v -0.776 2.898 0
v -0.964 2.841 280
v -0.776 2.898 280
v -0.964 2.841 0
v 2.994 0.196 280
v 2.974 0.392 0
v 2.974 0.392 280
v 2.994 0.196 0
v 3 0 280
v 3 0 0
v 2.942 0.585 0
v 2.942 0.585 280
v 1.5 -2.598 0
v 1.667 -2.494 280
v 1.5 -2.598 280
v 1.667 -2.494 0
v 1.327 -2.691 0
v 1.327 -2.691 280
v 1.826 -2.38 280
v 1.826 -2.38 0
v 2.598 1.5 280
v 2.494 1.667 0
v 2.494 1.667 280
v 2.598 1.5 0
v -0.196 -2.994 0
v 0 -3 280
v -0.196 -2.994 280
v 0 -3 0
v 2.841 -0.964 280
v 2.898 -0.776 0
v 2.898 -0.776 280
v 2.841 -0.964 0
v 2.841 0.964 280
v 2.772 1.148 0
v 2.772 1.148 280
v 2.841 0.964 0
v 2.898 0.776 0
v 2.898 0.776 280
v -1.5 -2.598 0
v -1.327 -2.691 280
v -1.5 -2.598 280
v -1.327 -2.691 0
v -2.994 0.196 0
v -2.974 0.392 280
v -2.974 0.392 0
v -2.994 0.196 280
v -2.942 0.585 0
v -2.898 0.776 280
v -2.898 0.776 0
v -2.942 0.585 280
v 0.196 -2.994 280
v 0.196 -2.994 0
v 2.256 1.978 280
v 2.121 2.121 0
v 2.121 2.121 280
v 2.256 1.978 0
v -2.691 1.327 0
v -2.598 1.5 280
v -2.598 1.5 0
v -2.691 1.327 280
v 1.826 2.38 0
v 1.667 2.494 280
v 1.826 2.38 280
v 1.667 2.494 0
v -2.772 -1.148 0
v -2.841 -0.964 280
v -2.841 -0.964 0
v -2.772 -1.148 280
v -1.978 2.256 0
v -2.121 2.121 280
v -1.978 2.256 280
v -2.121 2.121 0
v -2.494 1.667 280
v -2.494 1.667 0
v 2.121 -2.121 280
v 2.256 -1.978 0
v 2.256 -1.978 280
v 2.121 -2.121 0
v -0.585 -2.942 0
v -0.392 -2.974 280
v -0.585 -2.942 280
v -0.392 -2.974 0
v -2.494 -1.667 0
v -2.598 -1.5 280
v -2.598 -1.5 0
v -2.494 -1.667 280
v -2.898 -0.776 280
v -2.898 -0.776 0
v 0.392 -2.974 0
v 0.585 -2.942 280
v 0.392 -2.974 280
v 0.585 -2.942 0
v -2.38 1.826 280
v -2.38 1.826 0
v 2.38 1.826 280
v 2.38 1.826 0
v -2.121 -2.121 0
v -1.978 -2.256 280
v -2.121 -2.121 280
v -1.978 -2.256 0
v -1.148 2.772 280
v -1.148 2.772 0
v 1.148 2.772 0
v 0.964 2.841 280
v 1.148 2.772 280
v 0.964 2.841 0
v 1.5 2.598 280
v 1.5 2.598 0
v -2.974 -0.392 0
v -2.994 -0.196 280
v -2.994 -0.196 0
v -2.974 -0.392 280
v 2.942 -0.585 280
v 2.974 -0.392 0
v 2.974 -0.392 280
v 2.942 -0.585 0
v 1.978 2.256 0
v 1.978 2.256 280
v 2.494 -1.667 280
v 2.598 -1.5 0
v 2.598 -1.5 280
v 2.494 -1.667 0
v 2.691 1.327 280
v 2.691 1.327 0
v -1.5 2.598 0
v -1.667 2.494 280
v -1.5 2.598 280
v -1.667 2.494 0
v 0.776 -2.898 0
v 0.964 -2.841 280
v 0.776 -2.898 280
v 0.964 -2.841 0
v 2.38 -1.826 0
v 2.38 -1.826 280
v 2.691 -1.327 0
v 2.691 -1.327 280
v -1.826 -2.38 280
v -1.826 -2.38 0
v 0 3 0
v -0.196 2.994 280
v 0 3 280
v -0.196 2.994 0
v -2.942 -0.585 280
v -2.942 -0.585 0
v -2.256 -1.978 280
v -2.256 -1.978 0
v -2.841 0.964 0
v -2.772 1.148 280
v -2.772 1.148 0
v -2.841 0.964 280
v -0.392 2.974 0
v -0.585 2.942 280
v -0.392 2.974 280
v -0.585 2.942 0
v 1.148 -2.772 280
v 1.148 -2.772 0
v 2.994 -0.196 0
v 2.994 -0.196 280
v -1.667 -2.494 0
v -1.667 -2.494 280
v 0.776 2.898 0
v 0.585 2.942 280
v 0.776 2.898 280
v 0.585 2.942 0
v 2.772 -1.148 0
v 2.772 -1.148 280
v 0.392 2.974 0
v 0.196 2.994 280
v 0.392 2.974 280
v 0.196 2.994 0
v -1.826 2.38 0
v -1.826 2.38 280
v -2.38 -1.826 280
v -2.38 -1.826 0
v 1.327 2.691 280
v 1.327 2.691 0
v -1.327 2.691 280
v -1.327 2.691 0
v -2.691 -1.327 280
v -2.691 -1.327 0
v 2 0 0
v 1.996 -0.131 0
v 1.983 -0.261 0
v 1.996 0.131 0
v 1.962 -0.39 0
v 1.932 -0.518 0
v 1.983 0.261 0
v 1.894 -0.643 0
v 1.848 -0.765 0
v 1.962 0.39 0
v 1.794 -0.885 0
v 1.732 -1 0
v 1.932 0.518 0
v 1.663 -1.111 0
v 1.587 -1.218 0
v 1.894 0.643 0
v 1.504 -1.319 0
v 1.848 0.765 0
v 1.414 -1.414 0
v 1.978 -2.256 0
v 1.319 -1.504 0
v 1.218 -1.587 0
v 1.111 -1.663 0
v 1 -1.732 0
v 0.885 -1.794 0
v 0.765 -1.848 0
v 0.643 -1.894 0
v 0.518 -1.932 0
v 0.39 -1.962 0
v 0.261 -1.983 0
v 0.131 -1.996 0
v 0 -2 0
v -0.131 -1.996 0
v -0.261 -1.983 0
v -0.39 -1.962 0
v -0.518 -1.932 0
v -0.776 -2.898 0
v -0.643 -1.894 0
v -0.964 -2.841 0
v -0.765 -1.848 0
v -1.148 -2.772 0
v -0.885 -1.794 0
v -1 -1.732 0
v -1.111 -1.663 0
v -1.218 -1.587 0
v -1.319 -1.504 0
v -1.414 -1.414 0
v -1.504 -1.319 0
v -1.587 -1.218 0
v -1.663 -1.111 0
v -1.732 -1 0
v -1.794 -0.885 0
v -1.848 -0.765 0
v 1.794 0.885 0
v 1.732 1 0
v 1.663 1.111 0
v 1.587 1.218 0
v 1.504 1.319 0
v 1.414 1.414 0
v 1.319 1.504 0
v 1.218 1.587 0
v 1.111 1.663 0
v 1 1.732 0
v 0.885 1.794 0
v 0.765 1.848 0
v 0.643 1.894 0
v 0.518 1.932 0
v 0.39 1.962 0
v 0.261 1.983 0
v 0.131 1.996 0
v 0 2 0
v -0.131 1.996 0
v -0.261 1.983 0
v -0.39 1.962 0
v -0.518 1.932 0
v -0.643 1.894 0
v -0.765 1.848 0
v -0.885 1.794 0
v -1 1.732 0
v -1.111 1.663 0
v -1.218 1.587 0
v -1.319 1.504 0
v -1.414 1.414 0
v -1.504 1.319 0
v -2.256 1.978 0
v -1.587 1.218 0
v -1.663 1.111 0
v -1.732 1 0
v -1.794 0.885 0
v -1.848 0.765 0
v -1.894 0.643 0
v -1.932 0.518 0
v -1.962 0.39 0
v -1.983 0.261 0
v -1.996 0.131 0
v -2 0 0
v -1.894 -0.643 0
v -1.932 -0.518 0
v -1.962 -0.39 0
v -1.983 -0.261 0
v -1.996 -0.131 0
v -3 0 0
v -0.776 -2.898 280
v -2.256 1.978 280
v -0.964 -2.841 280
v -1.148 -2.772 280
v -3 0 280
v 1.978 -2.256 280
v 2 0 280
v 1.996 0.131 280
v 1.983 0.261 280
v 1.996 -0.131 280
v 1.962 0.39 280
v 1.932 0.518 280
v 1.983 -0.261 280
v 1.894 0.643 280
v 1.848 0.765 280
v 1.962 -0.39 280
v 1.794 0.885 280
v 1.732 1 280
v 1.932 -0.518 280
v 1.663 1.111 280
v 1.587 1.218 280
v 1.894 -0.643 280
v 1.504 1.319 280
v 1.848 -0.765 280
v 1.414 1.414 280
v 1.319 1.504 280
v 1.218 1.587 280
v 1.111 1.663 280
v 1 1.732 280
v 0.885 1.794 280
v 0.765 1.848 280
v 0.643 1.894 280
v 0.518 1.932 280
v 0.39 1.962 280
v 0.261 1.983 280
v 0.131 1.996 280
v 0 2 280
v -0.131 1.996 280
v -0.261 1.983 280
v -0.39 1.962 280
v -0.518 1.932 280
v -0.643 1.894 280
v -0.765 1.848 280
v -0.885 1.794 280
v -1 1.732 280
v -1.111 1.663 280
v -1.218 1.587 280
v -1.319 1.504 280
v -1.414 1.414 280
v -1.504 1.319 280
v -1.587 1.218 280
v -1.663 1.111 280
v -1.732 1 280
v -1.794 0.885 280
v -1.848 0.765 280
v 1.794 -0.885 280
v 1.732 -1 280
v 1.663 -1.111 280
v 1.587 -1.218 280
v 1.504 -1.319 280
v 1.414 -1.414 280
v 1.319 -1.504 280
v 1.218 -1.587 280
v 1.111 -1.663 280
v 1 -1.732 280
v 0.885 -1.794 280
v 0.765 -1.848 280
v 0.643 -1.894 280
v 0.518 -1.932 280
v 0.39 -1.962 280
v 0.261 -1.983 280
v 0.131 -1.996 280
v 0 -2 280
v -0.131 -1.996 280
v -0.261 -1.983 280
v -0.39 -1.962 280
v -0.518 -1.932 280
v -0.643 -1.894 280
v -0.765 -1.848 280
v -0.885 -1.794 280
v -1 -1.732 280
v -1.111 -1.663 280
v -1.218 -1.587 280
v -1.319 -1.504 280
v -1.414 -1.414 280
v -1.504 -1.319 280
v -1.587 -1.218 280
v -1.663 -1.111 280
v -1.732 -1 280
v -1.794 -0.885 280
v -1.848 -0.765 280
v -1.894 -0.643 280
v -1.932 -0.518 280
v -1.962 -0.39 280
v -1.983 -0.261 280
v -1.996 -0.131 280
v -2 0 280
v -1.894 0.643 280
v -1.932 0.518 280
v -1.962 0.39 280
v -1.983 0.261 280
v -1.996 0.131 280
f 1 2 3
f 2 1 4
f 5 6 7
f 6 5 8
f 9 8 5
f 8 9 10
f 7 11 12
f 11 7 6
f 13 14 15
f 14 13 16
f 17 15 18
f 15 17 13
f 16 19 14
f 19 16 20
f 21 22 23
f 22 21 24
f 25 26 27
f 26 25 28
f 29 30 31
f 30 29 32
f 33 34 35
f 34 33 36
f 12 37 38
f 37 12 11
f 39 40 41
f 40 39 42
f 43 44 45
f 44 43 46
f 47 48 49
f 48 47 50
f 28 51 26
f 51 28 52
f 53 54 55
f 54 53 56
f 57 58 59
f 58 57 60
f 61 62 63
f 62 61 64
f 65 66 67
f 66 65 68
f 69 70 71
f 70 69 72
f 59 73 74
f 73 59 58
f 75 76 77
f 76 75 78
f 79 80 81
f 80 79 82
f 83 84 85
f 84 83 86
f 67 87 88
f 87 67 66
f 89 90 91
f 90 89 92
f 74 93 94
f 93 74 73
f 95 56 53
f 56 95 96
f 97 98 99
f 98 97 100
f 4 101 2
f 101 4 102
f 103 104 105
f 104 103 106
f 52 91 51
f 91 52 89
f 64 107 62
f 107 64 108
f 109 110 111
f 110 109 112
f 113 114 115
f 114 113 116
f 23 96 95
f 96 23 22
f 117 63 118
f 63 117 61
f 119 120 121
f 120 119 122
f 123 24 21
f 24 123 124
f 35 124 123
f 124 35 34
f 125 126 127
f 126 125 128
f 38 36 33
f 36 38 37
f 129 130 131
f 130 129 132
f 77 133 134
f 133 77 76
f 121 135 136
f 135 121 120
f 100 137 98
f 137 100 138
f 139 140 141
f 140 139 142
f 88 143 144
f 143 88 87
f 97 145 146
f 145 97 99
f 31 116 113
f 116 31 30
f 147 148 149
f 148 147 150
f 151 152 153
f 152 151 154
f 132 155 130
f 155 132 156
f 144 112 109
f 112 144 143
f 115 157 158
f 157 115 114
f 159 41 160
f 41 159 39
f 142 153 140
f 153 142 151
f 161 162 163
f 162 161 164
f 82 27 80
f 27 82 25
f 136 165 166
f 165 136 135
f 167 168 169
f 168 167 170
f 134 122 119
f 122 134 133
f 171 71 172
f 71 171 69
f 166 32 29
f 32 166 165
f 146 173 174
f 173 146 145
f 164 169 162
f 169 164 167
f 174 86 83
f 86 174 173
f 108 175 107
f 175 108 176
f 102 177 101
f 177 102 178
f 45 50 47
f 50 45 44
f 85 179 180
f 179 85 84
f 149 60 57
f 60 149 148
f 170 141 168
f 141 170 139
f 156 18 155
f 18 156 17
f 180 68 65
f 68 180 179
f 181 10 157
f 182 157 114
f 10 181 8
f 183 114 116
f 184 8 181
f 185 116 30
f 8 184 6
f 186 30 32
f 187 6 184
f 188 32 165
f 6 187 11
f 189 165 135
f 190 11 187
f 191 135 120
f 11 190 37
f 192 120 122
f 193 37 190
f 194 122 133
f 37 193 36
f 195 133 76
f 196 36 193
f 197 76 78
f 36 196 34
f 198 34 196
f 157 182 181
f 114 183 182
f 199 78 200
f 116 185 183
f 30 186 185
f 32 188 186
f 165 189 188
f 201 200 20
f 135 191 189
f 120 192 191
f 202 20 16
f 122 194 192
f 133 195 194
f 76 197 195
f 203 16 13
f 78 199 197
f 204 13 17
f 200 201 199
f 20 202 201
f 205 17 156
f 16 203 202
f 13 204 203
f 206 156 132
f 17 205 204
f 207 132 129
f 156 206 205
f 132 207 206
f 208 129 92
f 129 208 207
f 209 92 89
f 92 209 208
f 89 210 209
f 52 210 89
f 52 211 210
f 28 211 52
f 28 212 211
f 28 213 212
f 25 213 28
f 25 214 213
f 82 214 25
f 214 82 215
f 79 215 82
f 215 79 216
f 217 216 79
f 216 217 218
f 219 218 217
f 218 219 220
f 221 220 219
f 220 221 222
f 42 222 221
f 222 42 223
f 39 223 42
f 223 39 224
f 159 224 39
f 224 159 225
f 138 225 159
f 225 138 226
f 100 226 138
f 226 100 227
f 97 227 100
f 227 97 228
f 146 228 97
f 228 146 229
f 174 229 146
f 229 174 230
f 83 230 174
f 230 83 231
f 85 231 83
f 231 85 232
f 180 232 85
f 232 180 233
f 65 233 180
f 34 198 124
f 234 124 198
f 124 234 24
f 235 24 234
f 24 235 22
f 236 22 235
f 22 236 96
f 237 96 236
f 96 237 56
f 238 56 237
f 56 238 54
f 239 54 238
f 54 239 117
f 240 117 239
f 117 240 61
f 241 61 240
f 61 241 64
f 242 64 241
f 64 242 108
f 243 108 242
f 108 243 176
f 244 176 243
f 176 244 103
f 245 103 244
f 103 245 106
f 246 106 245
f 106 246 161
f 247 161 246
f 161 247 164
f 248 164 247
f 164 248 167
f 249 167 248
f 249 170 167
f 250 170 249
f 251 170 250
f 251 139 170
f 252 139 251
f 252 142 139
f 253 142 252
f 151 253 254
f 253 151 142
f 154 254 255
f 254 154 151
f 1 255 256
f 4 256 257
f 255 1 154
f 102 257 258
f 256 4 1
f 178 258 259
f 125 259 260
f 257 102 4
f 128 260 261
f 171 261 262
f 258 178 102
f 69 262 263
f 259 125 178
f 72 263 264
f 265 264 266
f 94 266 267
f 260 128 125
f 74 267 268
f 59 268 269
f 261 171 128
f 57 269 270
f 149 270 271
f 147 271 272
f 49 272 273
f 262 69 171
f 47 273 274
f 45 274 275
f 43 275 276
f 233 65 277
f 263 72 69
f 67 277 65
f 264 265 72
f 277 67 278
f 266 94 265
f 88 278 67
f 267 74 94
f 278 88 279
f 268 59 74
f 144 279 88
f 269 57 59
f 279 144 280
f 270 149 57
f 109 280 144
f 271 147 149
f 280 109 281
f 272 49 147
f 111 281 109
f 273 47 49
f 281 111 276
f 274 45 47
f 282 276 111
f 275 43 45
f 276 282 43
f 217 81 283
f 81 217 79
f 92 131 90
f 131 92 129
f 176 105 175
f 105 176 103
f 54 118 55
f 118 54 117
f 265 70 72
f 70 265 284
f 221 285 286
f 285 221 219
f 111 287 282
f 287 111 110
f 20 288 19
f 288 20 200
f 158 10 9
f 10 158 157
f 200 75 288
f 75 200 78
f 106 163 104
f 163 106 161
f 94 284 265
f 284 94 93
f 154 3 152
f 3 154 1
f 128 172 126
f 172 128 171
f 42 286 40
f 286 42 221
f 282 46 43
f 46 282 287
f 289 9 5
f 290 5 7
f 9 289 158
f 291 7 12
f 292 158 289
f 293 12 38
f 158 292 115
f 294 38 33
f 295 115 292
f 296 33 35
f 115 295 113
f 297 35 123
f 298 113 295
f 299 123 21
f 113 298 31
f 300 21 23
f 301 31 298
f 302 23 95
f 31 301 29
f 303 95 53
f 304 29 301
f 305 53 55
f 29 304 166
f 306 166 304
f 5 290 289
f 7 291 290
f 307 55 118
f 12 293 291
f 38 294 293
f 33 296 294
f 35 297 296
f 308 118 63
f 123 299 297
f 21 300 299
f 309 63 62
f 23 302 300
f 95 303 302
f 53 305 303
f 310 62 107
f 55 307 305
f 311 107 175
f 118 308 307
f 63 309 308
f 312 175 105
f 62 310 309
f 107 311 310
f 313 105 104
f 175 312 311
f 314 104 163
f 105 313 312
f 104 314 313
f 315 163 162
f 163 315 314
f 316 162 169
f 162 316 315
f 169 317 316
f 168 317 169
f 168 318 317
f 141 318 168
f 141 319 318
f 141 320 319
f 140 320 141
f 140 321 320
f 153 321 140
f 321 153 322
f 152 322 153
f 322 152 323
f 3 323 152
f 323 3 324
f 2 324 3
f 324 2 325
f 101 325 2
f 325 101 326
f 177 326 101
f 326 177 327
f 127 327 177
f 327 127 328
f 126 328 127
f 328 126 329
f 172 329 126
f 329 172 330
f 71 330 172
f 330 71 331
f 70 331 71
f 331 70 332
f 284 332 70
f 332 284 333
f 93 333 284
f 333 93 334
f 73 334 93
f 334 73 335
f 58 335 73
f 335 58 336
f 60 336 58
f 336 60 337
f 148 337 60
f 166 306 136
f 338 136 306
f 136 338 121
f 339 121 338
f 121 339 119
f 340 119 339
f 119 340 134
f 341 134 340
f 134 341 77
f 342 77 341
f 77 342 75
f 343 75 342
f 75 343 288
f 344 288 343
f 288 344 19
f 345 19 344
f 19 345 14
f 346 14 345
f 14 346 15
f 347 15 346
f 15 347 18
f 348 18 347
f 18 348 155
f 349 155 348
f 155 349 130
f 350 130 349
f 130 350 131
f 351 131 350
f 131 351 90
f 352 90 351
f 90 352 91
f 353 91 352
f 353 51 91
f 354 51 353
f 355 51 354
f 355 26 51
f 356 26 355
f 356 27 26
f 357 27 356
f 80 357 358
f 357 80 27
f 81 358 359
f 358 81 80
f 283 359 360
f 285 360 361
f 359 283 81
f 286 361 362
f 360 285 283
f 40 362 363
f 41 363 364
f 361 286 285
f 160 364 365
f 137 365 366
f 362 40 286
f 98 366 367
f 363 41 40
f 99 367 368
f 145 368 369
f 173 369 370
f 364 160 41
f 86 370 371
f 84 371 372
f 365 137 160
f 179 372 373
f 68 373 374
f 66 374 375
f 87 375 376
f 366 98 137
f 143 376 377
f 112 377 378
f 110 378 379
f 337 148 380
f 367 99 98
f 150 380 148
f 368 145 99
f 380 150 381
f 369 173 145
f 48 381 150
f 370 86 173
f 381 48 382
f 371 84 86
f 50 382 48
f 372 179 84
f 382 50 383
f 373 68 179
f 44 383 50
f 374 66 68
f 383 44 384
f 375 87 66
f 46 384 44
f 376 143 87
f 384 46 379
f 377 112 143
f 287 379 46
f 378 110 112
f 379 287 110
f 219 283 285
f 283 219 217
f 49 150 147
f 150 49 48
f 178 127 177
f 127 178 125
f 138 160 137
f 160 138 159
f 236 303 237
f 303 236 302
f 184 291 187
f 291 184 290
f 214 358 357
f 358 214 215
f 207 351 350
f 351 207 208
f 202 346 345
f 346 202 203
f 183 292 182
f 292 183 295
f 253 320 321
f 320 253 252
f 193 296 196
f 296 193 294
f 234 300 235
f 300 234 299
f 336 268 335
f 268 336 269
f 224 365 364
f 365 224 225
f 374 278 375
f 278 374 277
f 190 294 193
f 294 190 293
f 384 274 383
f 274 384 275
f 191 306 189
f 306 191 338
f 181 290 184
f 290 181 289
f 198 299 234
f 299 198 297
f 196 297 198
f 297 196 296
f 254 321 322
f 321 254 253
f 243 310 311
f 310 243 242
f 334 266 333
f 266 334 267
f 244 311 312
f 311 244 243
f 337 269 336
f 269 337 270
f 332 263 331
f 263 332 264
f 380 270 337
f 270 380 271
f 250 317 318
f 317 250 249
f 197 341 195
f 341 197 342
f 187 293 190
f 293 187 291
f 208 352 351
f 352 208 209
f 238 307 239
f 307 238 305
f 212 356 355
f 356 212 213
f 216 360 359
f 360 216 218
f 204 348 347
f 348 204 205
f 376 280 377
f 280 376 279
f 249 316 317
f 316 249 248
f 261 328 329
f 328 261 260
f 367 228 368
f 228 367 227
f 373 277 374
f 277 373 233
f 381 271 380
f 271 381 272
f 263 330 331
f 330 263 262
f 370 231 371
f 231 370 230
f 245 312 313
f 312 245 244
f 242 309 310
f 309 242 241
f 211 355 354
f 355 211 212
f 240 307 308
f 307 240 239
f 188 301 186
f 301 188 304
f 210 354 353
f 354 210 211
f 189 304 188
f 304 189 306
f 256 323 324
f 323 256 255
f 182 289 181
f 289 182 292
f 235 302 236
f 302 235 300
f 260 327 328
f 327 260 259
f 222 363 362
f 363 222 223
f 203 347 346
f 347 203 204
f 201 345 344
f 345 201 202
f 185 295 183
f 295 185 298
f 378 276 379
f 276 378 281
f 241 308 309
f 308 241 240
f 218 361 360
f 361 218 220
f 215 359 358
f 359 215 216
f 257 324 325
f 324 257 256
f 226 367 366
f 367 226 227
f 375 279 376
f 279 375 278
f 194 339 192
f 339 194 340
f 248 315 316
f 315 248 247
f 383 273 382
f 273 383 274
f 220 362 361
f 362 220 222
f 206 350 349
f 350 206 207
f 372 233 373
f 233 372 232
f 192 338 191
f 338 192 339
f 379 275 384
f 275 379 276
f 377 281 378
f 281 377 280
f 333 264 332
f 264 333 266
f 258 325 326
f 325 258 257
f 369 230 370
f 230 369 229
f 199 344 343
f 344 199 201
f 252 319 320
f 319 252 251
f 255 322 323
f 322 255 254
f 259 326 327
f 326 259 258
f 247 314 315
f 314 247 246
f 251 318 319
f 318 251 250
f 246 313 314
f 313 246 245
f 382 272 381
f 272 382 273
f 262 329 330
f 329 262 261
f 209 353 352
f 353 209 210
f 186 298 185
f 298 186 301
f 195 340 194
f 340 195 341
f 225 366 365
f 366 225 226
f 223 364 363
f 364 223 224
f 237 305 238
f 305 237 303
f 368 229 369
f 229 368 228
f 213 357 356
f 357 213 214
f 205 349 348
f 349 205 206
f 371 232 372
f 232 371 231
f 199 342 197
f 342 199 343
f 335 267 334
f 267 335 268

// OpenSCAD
// file: ../../../conf/printer_config.scad
/**********************************************************************************************************************
 **
 ** conf/printer_config.scad
 **
 ** This file contains the main control variables that determine the size and shape of the printer. Note that in the
 ** actual parts specifications, the constants defined here will only ever be accessed through functions defined in
 ** conf/derived_sizes.scad exclusively to allow for easier adaptation, should the mode of calculation change. 
 **
 ** All sizes in mm. Caution: Little to no cross-checking is implemented. Change values sensibly and one at a time.
 **
 ** This file is NOT to be included by any other file except for conf/derived_sizes.scad.
 **
 **********************************************************************************************************************/

// ===== PRINTER CONFIGURATION ========================================================================================

// The length of the vertical MakerSlide extrusions that make up the rails for the carriages.
FRAME_V_RAIL_HEIGHT = 800;

// The length of the horizontal 20x20 V-Slot extrusions that form the sides of the triangle.
FRAME_H_RAIL_LENGTH = 400;

// ===== FABRICATED PART DIMENSIONS ===================================================================================

// The additional clearance to leave around the MakerSlide extrusion.
MAKERSLIDE_CLEARANCE = 0.05;

// The thickness of the walls outside the extruded parts.
FRAME_PART_WALL_THICKNESS = 3;

// The thickness of the wall that separates the vertical rails from the horizontal extrusions.
FRAME_V_H_RAIL_SEPARATION = 8;

// The depth of the holes that hold the V-Slot extrusions.
FRAME_PART_VSLOT_DEPTH = 30;

// The depth of the holes in the foot that hold the MakerSlide extrusions.
FRAME_FOOT_MAKERSLIDE_DEPTH = 25; 

// The height of the bracket that holds the motor. WARNING: Increasing this might make it difficult to 
// turn the screws that hold the motor.
FRAME_MOTOR_BRACKET_HEIGHT = 25;

// The height of the bracket that holds the intermediate level with the working surface (print bed).
FRAME_BED_BRACKET_HEIGHT = 25; 

// The depth of the holes in the head that hold the MakerSlide extrusions.
FRAME_HEAD_MAKERSLIDE_DEPTH = 35; 

// The thickness of the carriage base plate. A thicker plate will make the carriage stiffer, but cost more
// material to print and take away space from the working area.
CARRIAGE_PLATE_THICKNESS = 6;

// The width of the border around the holes in the carriage base plate that hold the V-Wheels. 
CARRIAGE_PLATE_BORDER_WIDTH = 8;

// The range by which the vertical belt tensioner can be adjusted.
TENSIONER_RANGE = 15;

// The distance between the rods that hold the effector.
ROD_DISTANCE = 65;

// The outer diameter of the rods.
ROD_OUTER_DIAMETER = 6;

// The inner diameter of the rods. Set to 0 if the rods are not hollow.
ROD_INNER_DIAMETER = 4;

// The additional clearance to leave between the rod and the holder.
ROD_CLEARANCE = 0.05;

// The thickness of the outer wall around the rod.
ROD_HOLDER_WALL_THICKNESS = 2;

// The depth of the insets that hold the rods.
ROD_HOLDER_DEPTH = 10;

// The minimum angle of the arms.
ROD_MIN_ANGLE = 20;

// The factor used to round up the rod length.
ROD_ROUND_UP_TO = 5;

// The thickness of the magnet holder arms.
MAGNET_HOLDER_THICKNESS = 5;

// The additional clearance to leave around the magnet holder pin.
MAGNET_CLEARANCE = 0.025;

// The upward angle of the ball holder on the carriage.
CARRIAGE_BALL_HOLDER_ANGLE = 10;

// The additional distance between the magnets on the effector (not the rod distance - the other one :-)).
// This value is added to the minimum distance determined by the magnet size and wall thickness.
EFFECTOR_BALL_ADDITIONAL_DISTANCE = 5;

// The thickness of the effector plate.
EFFECTOR_THICKNESS = 8;
// main file
/**********************************************************************************************************************
 **
 ** parts/vitamins/mechanic/rod.scad
 **
 ** This file renders a carbon fiber rod used for the arms.
 **
 **********************************************************************************************************************/

include <../../../conf/part_sizes.scad>
include <../../../conf/derived_sizes.scad>

$fn = 96;
difference() {
	cylinder(d = rod_outer_diameter(), h = arm_rod_length());
	translate([0, 0, -epsilon()])
		cylinder(d = rod_inner_diameter(), h = arm_rod_length() + 2 * epsilon());
}
